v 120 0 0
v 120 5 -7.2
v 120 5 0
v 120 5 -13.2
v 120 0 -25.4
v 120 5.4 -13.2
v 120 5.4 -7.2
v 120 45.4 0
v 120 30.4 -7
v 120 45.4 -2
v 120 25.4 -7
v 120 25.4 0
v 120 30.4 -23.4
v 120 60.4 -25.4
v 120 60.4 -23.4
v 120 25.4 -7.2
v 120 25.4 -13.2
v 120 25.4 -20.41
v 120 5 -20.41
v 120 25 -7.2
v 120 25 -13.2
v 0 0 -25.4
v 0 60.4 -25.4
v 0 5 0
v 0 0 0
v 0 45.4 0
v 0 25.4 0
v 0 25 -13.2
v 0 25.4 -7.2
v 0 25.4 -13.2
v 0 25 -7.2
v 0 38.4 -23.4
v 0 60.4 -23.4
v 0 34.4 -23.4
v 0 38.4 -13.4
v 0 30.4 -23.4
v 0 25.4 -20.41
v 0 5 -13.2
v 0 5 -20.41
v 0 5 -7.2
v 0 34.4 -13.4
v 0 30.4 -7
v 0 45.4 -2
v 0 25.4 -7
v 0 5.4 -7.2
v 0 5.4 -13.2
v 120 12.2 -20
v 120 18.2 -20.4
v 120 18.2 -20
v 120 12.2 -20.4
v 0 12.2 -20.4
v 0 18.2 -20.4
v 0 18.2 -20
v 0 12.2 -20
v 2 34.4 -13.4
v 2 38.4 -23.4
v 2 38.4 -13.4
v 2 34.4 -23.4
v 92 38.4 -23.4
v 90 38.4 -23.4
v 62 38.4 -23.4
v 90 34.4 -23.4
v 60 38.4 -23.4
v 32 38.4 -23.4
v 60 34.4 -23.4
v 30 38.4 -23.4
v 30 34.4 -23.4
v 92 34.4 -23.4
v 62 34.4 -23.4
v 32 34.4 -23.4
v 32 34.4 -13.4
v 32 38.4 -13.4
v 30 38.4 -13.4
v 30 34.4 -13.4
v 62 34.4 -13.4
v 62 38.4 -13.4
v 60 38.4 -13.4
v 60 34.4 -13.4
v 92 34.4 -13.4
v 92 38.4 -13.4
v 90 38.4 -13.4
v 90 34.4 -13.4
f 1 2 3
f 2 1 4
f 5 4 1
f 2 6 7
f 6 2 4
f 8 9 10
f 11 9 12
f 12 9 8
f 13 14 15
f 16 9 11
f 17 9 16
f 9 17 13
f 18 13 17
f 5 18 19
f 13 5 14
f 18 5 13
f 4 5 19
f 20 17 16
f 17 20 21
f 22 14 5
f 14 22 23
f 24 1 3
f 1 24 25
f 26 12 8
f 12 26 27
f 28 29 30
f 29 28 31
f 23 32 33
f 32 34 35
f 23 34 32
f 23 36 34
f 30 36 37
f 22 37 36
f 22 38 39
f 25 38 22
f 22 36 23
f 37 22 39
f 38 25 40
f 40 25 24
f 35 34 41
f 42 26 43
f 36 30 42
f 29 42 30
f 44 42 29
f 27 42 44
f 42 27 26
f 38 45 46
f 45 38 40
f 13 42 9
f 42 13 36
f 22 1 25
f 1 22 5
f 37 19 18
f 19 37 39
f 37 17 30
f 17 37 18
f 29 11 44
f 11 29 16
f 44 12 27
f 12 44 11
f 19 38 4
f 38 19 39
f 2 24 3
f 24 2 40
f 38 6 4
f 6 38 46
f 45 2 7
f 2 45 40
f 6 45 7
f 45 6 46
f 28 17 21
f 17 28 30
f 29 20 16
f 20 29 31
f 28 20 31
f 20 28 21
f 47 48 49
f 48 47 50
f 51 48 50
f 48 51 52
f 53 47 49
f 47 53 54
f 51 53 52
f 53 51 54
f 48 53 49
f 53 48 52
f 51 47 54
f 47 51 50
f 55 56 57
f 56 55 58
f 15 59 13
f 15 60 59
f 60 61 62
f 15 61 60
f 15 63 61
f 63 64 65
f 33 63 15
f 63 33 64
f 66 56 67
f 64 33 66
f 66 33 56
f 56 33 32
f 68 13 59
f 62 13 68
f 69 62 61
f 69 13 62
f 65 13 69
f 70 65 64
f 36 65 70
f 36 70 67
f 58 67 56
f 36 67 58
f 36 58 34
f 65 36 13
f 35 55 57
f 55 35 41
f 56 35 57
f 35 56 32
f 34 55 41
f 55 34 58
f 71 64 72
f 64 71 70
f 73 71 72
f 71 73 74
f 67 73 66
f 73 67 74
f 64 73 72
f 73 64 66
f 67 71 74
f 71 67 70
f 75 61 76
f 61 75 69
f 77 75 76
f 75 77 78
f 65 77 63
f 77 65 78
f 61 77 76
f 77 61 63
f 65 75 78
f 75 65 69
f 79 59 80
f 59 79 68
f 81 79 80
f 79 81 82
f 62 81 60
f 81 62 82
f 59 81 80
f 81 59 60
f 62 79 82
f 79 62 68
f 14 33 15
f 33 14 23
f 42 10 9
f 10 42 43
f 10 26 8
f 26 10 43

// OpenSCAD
// units
in = 25.4;
cm = 10;
mm = 1;
inf = 10e10;
nc = 10e-3;
$fn = 200;

// params
wall_thickness = 5*mm;
led_clip_thickness = 2*mm;

length = 12*cm;
shield_length = 3*cm;
back_shield_length = 1.5*cm;
clip_length = 1*cm;
led_strip_space = 4*mm;
clip_spacing = 3*cm;


// constants
2020_width = 20.4*mm;
2020_center_width = 6*mm;
2020_center_depth = .4*mm;
outer_width = 2020_width + wall_thickness*2;
outer_height = 2020_width + wall_thickness;

module 2020_hug(length) {
    difference() {
        // tube
        cube(size=[length, outer_width, outer_height]);

        // subtract where 2020 goes
        translate([-0.01, wall_thickness, -0.01])
        cube(size=[length+0.02, 2020_width, 2020_width+0.02]);
    }

    // outside snap indent
    translate([0, wall_thickness, 2020_width/2-2020_center_width/2])
    cube(size=[length,2020_center_depth,2020_center_width]);
    
    // inside snap
    translate([0, outer_width-wall_thickness-2020_center_depth, 2020_width/2-2020_center_width/2])
    cube(size=[length,2020_center_depth,2020_center_width]);
    
    // top snap
    translate([0, wall_thickness+2020_width/2-2020_center_width/2, 2020_width-2020_center_depth])
    cube(size=[length,2020_center_width,2020_center_depth]);
}

mirror([0,0,1]) {
    2020_hug(length);

    // user-side shield
    translate([0, 2020_width+wall_thickness, outer_height-led_clip_thickness])
    cube([length, shield_length+wall_thickness, led_clip_thickness]);

    // back-side shield
    translate([0, 2020_width+wall_thickness, 0])
    hull() {
        cube([length, back_shield_length+wall_thickness, led_clip_thickness]);
        cube([length, wall_thickness, led_clip_thickness+wall_thickness]);
    }

    for (i=[0:clip_spacing:length-led_clip_thickness]) {
        translate([i/10*1*cm, outer_width+led_strip_space, outer_height-led_clip_thickness-clip_length])
        cube([led_clip_thickness, led_clip_thickness*2, clip_length]);
    }
}
